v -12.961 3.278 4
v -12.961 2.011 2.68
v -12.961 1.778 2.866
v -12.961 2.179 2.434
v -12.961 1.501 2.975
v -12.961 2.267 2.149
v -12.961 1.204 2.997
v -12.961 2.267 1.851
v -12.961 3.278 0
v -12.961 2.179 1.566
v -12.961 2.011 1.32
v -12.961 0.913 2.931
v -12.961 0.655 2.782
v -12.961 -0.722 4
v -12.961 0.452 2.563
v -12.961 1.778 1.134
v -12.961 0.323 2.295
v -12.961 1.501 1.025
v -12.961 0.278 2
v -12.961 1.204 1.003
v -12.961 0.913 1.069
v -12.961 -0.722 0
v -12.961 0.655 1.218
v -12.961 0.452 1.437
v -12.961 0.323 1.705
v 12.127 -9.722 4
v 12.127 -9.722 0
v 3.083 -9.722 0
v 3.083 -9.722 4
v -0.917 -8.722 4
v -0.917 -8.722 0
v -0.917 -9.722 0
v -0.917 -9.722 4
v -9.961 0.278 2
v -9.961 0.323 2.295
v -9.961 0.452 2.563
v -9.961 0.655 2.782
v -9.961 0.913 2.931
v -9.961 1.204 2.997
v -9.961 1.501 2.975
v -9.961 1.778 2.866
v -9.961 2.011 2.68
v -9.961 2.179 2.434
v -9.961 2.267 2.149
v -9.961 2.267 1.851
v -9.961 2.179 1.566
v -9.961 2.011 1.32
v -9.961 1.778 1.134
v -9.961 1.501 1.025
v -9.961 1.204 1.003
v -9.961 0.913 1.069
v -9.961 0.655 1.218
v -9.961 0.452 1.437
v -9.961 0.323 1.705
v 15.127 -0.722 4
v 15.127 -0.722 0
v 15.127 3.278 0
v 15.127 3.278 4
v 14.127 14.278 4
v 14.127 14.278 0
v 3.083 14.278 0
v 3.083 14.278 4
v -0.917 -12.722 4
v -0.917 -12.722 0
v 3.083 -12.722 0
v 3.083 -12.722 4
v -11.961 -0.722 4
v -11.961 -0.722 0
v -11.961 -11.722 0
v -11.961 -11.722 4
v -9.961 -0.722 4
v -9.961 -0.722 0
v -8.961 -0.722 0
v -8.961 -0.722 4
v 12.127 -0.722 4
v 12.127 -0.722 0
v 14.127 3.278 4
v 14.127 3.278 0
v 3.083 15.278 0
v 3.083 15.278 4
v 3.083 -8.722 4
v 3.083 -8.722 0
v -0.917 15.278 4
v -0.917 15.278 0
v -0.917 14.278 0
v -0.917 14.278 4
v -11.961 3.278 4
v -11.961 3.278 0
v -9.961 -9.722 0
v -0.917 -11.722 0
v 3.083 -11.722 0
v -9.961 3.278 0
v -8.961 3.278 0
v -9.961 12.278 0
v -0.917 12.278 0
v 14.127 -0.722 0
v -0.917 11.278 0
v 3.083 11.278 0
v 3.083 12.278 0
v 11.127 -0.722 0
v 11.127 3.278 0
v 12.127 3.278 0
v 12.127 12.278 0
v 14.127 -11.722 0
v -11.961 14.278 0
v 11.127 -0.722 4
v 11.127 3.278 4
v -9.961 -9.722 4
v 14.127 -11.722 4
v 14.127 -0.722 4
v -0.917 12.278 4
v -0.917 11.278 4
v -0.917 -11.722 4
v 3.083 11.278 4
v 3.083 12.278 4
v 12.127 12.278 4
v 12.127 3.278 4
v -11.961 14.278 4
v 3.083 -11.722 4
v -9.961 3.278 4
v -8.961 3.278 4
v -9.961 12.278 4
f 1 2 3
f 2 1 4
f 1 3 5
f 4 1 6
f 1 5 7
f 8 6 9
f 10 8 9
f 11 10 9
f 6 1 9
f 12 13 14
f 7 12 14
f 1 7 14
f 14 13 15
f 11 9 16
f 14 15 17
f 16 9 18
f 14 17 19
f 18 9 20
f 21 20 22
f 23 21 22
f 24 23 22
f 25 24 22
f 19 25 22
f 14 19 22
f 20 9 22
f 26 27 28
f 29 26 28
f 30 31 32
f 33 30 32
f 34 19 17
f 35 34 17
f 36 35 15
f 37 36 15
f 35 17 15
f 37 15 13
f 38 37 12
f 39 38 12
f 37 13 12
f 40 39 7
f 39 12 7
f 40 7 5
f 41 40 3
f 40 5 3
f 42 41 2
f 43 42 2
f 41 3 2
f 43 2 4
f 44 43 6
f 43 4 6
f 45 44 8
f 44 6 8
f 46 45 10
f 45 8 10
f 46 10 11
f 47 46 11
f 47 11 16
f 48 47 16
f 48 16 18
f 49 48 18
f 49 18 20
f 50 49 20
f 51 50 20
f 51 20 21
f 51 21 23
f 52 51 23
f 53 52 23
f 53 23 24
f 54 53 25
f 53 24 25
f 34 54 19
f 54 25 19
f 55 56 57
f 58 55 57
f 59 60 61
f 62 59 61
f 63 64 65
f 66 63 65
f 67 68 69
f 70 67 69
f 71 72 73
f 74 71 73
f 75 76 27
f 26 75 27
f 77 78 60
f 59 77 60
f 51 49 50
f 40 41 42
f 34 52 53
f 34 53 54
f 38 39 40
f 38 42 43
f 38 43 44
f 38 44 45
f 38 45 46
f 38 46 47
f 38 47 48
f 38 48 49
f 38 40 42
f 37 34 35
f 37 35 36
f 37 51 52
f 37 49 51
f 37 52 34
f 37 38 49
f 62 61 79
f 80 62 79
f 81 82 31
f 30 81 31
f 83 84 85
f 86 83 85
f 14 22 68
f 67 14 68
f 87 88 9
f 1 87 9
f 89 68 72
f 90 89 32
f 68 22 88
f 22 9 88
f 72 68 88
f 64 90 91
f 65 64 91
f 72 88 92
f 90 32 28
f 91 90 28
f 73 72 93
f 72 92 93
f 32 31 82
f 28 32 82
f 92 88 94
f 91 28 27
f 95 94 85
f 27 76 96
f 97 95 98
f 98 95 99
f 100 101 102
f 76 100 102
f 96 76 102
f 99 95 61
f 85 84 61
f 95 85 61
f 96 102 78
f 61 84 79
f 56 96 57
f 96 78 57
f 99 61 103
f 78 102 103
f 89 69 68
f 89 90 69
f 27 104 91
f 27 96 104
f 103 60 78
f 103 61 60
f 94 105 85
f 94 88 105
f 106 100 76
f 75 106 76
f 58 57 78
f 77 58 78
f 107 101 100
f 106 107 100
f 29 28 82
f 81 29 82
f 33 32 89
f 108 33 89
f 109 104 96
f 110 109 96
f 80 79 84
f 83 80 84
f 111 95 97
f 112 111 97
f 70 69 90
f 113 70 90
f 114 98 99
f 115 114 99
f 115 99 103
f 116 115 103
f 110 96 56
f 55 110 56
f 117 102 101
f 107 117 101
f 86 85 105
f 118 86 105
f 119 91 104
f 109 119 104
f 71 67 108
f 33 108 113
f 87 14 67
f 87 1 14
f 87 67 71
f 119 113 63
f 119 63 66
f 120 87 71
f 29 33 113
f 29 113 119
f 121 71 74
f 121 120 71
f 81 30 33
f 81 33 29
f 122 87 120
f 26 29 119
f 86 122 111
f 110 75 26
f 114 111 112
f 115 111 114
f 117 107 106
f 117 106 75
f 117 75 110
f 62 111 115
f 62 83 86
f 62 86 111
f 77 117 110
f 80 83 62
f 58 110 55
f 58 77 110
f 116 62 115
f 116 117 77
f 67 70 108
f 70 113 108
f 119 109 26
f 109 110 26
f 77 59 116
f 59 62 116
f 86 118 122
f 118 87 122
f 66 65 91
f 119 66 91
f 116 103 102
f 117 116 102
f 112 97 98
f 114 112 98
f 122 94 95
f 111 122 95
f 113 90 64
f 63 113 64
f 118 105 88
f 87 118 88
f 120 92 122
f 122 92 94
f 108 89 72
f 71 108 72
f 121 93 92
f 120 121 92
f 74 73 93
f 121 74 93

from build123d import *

# Parameters (mm, degrees)
BOSS_EXTRUDE1_DEPTH = 4
SKETCH3_R           = 1
CUT_EXTRUDE1_DEPTH  = 3


with BuildPart() as part:
    # Sketch1 → Boss-Extrude1 (new body)
    with BuildSketch(Plane.XY):
        Polygon((-12.961370769, -0.721570782), (-11.961370769, -0.721570782), (-11.961370769, -11.721570782), (-4.331288589, -11.721570782), (-0.917373368, -11.721570782), (-0.917373368, -12.721570782), (3.082626632, -12.721570782), (3.082626632, -11.721570782), (14.126624033, -11.721570782), (14.126624033, -0.721570782), (15.126624033, -0.721570782), (15.126624033, 3.278429218), (14.126624033, 3.278429218), (14.126624033, 14.278429218), (3.082626632, 14.278429218), (3.082626632, 15.278429218), (-0.917373368, 15.278429218), (-0.917373368, 14.278429218), (-11.961370769, 14.278429218), (-11.961370769, 3.278429218), (-12.961370769, 3.278429218), align=None)
        Polygon((3.082626632, 12.278429218), (12.126624033, 12.278429218), (12.126624033, 3.278429218), (11.126624033, 3.278429218), (11.126624033, -0.721570782), (12.126624033, -0.721570782), (12.126624033, -9.721570782), (3.082626632, -9.721570782), (3.082626632, -8.721570782), (-0.917373368, -8.721570782), (-0.917373368, -9.721570782), (-4.331288589, -9.721570782), (-9.961370769, -9.721570782), (-9.961370769, -0.721570782), (-8.961370769, -0.721570782), (-8.961370769, 3.278429218), (-9.961370769, 3.278429218), (-9.961370769, 12.278429218), (-0.917373368, 12.278429218), (-0.917373368, 11.278429218), (3.082626632, 11.278429218), align=None, mode=Mode.SUBTRACT)
    extrude(amount=BOSS_EXTRUDE1_DEPTH)

    # Sketch3 → Cut-Extrude1 (cut)
    with BuildSketch(Plane.ZY.offset(12.961370769)):
        with Locations(Location((2, 1.278429218, 0), (0, 0, 270))):
            Circle(SKETCH3_R)
    extrude(amount=-CUT_EXTRUDE1_DEPTH, mode=Mode.SUBTRACT)


solid = part.part
